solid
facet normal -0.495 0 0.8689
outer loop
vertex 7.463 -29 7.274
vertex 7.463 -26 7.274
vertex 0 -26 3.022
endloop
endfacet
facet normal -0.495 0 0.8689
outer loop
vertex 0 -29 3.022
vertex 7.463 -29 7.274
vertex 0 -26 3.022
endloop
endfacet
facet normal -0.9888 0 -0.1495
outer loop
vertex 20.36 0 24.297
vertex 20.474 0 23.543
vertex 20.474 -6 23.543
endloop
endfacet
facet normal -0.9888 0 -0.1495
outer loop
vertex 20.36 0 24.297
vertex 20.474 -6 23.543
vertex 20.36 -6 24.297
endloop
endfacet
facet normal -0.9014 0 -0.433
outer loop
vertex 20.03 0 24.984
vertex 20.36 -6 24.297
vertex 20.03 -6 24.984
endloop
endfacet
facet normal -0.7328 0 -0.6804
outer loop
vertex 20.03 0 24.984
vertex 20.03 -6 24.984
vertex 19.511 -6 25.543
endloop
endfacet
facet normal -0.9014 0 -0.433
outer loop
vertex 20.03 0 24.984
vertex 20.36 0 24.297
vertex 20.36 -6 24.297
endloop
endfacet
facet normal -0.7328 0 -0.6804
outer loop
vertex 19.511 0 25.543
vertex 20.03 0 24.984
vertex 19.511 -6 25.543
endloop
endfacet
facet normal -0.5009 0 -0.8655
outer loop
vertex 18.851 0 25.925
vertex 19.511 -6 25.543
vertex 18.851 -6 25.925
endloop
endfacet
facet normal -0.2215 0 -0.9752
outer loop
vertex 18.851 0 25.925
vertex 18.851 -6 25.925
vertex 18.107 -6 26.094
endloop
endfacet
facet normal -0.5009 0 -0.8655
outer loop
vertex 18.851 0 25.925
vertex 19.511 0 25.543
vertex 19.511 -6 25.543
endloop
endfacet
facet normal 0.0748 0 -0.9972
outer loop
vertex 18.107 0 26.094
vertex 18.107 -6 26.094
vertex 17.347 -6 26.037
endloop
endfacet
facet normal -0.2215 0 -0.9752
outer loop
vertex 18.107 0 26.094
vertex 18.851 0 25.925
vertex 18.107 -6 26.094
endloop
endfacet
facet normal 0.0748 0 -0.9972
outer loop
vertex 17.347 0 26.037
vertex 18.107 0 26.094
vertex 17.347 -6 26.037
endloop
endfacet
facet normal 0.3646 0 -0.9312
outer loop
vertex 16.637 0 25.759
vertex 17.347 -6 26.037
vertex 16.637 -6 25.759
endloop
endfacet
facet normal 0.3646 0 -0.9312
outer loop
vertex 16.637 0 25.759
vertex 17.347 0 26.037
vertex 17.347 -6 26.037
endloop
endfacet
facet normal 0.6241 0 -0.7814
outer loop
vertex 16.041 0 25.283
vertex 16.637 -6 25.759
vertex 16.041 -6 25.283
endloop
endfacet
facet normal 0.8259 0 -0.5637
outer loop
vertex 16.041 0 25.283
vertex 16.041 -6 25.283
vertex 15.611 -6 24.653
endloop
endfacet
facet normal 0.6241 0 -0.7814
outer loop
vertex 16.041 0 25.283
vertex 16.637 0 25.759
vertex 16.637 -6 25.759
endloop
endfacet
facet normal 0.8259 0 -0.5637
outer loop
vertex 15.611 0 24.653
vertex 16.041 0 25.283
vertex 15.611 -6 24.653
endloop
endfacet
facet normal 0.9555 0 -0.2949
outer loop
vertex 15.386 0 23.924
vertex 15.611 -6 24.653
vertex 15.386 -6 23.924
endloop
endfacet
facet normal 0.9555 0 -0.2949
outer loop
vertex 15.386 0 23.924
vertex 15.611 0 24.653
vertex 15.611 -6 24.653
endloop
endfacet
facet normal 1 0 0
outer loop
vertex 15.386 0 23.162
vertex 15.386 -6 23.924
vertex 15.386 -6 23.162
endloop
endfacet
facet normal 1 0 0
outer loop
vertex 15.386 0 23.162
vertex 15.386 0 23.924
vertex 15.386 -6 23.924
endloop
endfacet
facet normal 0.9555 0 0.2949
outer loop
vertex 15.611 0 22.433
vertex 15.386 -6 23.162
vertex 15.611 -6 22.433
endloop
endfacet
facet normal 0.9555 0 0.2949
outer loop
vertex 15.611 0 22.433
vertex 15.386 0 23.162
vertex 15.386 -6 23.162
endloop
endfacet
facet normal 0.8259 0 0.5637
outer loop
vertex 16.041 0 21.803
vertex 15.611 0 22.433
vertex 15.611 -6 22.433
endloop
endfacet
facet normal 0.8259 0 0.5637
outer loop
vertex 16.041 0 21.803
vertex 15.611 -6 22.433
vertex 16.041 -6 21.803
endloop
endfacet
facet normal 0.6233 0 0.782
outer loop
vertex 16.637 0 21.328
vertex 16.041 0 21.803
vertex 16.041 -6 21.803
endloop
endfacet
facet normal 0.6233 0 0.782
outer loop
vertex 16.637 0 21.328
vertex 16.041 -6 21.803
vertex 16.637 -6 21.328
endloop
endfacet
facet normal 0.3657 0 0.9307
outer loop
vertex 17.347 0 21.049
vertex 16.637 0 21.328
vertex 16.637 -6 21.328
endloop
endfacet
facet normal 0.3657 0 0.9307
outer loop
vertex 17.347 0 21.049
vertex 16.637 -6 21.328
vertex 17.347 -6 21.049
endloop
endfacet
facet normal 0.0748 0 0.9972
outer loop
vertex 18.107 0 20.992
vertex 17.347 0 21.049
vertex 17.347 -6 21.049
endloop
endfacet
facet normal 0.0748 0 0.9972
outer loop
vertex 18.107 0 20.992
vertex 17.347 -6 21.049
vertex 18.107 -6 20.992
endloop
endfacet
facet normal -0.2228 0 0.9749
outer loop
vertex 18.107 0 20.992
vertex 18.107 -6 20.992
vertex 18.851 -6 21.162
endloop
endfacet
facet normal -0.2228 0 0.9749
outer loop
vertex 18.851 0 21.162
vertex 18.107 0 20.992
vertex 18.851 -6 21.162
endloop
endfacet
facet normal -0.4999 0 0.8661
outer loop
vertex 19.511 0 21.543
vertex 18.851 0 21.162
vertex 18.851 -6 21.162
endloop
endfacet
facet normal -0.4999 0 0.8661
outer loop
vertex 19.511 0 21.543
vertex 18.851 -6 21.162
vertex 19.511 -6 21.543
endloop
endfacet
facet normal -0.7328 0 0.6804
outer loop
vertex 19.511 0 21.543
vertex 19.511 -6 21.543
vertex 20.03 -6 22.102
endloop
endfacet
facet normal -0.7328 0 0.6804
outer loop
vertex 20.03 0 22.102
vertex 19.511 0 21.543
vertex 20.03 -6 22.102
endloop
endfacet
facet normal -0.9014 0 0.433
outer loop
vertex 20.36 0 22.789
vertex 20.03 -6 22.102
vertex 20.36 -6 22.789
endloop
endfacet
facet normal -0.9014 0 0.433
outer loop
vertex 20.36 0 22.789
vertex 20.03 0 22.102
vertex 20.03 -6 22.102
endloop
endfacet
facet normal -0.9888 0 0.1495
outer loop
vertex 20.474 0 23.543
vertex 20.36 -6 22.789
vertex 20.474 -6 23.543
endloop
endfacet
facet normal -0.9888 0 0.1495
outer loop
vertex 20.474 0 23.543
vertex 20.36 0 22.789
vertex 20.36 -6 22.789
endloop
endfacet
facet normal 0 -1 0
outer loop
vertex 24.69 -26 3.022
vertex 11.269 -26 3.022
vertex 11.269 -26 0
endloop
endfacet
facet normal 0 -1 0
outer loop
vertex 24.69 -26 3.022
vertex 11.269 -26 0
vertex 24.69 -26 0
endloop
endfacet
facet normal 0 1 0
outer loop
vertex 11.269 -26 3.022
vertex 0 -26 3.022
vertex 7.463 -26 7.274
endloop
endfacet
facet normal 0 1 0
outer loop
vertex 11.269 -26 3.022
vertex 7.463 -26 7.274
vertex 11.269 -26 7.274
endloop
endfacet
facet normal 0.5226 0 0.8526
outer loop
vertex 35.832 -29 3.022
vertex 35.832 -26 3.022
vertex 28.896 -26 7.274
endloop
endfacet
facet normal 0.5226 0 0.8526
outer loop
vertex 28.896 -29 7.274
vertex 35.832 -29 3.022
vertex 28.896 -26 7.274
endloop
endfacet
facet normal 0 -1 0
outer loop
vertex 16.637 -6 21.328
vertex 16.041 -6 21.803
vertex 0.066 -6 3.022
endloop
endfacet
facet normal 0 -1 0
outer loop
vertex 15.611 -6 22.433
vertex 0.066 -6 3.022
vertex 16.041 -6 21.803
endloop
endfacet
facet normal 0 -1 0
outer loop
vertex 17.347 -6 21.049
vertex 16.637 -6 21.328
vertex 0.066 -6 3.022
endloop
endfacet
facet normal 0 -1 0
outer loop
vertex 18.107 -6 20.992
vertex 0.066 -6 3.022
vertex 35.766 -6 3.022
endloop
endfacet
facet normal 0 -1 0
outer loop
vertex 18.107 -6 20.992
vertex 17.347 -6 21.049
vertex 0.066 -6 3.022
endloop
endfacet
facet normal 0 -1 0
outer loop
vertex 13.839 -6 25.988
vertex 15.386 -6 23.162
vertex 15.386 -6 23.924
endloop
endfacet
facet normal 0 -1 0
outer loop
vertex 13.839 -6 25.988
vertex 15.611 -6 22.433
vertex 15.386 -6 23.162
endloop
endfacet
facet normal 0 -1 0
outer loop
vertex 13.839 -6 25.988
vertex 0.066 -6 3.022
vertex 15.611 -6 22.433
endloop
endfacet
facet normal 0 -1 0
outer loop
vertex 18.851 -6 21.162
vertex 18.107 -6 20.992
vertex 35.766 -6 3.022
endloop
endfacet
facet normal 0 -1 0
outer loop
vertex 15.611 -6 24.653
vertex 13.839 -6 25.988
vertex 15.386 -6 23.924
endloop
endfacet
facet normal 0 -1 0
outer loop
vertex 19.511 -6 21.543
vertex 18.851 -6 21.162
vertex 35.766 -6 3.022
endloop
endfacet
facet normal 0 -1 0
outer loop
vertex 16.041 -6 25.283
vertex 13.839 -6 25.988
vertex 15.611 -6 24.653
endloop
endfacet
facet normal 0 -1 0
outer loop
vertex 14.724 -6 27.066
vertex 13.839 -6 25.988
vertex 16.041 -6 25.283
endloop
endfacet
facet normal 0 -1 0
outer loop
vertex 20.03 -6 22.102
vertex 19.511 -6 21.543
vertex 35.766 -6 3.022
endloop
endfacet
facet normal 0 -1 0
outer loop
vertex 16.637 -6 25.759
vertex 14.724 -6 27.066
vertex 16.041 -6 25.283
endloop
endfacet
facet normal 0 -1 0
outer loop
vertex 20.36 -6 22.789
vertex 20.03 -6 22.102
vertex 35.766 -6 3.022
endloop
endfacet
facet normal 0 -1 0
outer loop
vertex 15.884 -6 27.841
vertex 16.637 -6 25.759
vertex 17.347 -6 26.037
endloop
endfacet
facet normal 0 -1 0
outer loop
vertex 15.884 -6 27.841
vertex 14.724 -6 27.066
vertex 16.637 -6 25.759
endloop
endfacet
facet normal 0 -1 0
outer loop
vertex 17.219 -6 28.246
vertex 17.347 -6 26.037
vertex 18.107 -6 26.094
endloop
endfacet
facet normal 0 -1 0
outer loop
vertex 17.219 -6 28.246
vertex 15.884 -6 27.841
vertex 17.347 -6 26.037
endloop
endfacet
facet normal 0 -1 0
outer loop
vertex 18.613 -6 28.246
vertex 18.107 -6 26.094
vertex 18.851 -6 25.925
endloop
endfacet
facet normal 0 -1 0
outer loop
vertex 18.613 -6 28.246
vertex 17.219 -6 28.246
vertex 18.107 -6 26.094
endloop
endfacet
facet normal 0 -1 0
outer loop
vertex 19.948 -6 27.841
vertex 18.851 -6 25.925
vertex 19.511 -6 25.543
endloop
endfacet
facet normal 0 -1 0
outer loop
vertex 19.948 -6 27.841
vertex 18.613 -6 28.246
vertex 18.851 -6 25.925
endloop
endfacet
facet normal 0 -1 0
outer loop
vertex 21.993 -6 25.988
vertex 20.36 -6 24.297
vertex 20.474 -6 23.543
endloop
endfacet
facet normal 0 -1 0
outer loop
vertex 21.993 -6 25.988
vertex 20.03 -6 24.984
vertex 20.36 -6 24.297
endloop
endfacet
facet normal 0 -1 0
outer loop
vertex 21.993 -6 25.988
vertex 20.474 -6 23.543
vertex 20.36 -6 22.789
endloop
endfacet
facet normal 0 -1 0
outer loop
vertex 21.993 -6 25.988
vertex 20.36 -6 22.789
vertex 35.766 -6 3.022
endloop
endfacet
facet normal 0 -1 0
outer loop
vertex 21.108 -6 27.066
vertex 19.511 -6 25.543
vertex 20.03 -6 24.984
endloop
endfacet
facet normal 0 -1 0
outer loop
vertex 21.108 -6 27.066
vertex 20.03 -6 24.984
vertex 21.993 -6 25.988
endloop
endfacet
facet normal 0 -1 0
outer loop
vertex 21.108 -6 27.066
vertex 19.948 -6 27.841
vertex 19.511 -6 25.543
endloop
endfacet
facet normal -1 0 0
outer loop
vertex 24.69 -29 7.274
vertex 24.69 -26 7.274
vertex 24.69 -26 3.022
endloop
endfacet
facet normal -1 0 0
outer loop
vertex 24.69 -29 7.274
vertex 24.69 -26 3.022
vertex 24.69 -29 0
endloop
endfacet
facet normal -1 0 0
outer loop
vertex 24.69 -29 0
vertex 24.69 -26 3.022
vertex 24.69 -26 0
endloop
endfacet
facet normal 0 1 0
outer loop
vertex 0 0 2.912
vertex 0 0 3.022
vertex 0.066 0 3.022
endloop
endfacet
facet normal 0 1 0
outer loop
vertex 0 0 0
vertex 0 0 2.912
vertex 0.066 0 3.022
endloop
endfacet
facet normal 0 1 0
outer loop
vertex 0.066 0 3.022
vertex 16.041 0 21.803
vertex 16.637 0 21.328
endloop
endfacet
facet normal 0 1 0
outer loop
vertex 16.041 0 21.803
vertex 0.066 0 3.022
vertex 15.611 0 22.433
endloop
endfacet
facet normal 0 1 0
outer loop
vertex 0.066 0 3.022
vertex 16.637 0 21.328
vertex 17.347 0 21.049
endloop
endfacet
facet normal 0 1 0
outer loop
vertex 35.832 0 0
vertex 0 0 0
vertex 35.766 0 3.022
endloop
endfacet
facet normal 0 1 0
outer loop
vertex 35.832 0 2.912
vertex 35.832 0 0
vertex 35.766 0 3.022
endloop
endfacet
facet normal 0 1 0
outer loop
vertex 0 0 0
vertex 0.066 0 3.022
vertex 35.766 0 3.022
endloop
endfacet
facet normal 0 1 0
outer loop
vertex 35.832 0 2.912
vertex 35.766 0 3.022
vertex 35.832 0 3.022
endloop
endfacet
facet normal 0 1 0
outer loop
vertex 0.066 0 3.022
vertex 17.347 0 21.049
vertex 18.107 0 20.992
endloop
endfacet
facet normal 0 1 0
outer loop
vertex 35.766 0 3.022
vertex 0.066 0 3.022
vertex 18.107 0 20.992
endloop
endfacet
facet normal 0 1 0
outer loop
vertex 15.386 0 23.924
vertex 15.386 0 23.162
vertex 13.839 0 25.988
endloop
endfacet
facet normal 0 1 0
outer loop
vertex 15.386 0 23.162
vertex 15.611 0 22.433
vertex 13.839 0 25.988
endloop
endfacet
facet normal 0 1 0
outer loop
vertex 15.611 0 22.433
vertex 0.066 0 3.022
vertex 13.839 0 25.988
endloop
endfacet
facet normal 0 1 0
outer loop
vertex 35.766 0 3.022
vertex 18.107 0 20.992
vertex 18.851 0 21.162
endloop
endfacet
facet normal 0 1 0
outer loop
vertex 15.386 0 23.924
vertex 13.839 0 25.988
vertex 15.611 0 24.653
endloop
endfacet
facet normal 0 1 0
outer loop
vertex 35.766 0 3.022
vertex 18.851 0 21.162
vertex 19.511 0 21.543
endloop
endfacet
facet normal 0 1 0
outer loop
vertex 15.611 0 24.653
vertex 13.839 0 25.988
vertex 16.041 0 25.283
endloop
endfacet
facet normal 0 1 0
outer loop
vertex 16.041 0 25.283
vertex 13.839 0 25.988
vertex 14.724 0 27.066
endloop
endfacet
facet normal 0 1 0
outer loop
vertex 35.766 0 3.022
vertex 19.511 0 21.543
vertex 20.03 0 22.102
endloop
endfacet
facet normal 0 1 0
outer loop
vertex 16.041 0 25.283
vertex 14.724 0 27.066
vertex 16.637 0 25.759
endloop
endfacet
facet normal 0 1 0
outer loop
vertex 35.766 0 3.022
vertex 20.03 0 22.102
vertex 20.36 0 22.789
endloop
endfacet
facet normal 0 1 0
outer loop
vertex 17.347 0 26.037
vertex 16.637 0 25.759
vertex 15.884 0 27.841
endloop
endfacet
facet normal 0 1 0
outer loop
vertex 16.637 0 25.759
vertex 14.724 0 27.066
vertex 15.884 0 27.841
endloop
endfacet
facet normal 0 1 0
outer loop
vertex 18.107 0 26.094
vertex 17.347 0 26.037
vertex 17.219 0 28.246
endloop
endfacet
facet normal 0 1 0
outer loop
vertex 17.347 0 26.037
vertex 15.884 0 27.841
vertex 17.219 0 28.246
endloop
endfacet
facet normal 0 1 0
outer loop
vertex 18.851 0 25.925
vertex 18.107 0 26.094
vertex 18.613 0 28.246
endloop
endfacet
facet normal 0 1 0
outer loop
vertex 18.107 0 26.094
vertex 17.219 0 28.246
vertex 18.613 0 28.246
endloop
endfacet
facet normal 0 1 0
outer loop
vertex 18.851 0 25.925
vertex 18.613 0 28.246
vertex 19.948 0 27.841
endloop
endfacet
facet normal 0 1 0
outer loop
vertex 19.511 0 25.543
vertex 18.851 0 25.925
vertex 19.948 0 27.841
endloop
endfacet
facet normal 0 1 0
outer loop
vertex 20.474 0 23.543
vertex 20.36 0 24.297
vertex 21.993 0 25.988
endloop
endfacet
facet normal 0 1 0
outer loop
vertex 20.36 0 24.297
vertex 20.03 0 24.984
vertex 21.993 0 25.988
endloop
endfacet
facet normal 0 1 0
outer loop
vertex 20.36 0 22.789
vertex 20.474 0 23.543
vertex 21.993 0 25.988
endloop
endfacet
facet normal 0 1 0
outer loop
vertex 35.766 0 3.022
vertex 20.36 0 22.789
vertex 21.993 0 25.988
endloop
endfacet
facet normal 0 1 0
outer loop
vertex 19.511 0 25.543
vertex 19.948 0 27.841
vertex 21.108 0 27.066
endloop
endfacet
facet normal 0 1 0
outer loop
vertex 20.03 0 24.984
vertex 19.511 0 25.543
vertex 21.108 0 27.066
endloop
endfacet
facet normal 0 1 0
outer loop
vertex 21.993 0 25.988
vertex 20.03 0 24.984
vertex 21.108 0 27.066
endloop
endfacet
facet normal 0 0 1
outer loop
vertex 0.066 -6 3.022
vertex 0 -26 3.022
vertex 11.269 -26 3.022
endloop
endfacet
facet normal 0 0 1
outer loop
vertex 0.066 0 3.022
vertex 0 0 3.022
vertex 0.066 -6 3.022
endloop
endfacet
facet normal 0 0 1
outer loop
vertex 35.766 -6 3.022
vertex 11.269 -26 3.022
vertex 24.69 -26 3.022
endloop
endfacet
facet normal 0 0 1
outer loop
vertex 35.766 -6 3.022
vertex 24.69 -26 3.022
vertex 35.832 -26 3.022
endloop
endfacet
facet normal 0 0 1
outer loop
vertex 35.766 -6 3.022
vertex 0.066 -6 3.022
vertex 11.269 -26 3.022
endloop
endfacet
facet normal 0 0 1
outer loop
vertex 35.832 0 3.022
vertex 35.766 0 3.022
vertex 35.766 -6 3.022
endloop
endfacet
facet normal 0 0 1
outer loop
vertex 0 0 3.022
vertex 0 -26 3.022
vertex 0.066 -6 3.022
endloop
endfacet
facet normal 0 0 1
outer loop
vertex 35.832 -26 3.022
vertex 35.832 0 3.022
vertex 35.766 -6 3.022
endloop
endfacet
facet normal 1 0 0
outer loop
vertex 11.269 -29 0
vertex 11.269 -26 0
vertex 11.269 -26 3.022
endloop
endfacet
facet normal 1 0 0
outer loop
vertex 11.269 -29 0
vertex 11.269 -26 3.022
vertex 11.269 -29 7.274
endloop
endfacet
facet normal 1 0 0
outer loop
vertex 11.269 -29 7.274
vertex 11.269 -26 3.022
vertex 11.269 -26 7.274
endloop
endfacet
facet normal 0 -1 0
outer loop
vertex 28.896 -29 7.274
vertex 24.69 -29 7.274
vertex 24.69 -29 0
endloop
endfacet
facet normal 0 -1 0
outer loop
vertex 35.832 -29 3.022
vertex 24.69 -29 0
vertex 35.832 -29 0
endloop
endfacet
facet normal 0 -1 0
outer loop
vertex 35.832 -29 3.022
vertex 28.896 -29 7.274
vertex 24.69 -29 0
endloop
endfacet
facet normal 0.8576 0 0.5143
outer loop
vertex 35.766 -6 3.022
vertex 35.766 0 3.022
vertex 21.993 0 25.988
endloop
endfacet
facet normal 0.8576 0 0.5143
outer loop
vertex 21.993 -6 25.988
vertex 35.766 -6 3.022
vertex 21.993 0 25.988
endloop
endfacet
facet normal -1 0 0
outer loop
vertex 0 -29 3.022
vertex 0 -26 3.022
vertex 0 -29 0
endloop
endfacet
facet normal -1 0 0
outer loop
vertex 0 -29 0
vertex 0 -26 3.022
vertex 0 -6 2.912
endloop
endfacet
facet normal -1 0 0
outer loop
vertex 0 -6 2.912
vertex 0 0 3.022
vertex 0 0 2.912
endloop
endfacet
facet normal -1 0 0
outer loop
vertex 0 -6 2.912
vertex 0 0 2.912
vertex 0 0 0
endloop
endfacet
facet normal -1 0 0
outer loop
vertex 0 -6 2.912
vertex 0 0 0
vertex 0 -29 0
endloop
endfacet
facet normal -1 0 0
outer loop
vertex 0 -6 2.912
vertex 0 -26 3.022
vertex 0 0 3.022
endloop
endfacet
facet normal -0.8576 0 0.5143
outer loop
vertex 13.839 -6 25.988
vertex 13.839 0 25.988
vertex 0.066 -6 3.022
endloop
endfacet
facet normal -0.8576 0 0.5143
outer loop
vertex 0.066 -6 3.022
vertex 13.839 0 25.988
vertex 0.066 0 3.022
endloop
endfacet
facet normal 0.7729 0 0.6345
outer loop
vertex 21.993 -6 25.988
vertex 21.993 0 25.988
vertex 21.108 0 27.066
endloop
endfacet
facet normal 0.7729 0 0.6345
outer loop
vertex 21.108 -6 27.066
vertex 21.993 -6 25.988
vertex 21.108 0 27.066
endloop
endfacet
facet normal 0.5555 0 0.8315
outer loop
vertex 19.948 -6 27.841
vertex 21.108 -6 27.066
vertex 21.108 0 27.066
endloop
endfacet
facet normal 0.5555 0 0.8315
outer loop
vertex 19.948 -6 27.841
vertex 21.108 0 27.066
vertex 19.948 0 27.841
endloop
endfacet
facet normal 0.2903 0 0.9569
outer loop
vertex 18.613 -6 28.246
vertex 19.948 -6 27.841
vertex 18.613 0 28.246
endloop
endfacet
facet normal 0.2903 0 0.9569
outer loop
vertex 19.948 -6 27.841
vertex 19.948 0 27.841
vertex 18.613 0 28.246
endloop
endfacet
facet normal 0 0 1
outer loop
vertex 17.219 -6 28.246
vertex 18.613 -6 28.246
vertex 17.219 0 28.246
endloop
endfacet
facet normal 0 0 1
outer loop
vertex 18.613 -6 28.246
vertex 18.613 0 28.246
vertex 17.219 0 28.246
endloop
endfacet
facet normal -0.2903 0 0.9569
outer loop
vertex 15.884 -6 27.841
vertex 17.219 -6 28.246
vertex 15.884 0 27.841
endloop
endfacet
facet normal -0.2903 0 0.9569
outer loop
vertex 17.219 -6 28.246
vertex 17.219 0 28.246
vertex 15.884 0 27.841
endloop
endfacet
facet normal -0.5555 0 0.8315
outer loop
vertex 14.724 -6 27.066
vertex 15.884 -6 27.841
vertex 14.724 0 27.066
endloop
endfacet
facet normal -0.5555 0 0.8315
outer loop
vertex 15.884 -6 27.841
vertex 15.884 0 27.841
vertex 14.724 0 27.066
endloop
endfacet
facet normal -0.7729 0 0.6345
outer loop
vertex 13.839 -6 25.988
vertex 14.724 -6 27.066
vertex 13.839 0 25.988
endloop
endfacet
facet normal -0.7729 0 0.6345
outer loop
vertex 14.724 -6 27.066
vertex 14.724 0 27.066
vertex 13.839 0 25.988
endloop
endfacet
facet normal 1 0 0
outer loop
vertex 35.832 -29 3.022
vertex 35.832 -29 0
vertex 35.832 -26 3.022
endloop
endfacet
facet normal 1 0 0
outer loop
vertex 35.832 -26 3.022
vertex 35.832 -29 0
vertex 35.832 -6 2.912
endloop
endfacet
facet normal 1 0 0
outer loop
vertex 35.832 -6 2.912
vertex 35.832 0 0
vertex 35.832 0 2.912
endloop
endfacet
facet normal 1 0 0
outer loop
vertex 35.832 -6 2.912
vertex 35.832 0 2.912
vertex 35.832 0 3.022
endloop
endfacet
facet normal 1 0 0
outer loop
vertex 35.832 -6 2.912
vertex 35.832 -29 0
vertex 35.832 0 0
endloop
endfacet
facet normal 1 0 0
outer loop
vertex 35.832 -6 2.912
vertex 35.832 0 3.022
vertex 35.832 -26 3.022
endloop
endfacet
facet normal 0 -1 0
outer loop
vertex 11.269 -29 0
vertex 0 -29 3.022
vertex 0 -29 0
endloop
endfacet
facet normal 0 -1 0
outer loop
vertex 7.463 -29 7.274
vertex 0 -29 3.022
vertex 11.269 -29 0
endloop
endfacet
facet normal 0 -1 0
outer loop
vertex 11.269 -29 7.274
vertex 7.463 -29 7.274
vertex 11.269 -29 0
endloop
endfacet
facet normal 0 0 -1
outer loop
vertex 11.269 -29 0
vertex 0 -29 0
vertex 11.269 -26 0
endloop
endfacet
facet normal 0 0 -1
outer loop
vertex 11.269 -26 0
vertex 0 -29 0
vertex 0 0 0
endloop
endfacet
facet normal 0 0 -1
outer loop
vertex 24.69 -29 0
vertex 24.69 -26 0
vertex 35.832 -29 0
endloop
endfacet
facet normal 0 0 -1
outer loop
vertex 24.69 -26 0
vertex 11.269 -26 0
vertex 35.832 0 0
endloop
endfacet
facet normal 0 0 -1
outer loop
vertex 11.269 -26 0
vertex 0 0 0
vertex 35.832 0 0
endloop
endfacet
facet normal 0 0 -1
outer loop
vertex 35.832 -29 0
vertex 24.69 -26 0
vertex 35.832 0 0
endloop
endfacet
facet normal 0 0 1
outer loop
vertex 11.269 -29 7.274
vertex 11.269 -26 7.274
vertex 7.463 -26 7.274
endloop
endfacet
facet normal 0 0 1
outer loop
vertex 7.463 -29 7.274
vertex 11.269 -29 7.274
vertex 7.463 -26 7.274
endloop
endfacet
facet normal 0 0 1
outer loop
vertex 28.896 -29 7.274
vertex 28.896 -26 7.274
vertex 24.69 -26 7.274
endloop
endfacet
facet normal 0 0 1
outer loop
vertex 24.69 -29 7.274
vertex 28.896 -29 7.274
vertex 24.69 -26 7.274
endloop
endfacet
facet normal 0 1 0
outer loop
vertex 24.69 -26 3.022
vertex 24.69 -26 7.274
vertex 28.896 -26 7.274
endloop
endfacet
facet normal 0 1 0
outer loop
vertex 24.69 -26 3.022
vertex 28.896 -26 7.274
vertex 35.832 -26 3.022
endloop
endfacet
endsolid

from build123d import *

# Parameters (mm, degrees)
F0_W     = 35.83182
F0_H     = 3.02196
F1_DEPTH = 26
F2_R     = 2.558205
F3_DEPTH = 6
F5_DEPTH = 3


with BuildPart() as f1:
    # F0 (on Front) → F1 (new body)
    with BuildSketch(Plane.XZ):
        with Locations((17.91591, 1.51098)):
            Rectangle(F0_W, F0_H)
    extrude(amount=F1_DEPTH)

    # F2 (on Front) → F3 (join)
    with BuildSketch(Plane.XZ):
        with BuildLine():
            Line((0, 2.911769), (35.83182, 2.911769))
            Line((35.83182, 2.911769), (21.992884, 25.98811))
            ThreePointArc((21.992884, 25.98811), (17.91591, 28.297043), (13.838936, 25.98811))
            Line((13.838936, 25.98811), (0, 2.911769))
        make_face()
        with Locations((17.91591, 23.543139)):
            Circle(F2_R, mode=Mode.SUBTRACT)
    extrude(amount=F3_DEPTH)

    # F4 (on face) → F5 (join)
    with BuildSketch(Plane.XZ.offset(26)):
        Polygon((0, 3.02196), (0, 0), (11.269107, 0), (11.269107, 7.273588), (7.463317, 7.273588), align=None)
        Polygon((24.689507, 0), (35.83182, 0), (35.83182, 3.02196), (28.895905, 7.273588), (24.689507, 7.273588), align=None)
    extrude(amount=F5_DEPTH)


solid = f1.part
